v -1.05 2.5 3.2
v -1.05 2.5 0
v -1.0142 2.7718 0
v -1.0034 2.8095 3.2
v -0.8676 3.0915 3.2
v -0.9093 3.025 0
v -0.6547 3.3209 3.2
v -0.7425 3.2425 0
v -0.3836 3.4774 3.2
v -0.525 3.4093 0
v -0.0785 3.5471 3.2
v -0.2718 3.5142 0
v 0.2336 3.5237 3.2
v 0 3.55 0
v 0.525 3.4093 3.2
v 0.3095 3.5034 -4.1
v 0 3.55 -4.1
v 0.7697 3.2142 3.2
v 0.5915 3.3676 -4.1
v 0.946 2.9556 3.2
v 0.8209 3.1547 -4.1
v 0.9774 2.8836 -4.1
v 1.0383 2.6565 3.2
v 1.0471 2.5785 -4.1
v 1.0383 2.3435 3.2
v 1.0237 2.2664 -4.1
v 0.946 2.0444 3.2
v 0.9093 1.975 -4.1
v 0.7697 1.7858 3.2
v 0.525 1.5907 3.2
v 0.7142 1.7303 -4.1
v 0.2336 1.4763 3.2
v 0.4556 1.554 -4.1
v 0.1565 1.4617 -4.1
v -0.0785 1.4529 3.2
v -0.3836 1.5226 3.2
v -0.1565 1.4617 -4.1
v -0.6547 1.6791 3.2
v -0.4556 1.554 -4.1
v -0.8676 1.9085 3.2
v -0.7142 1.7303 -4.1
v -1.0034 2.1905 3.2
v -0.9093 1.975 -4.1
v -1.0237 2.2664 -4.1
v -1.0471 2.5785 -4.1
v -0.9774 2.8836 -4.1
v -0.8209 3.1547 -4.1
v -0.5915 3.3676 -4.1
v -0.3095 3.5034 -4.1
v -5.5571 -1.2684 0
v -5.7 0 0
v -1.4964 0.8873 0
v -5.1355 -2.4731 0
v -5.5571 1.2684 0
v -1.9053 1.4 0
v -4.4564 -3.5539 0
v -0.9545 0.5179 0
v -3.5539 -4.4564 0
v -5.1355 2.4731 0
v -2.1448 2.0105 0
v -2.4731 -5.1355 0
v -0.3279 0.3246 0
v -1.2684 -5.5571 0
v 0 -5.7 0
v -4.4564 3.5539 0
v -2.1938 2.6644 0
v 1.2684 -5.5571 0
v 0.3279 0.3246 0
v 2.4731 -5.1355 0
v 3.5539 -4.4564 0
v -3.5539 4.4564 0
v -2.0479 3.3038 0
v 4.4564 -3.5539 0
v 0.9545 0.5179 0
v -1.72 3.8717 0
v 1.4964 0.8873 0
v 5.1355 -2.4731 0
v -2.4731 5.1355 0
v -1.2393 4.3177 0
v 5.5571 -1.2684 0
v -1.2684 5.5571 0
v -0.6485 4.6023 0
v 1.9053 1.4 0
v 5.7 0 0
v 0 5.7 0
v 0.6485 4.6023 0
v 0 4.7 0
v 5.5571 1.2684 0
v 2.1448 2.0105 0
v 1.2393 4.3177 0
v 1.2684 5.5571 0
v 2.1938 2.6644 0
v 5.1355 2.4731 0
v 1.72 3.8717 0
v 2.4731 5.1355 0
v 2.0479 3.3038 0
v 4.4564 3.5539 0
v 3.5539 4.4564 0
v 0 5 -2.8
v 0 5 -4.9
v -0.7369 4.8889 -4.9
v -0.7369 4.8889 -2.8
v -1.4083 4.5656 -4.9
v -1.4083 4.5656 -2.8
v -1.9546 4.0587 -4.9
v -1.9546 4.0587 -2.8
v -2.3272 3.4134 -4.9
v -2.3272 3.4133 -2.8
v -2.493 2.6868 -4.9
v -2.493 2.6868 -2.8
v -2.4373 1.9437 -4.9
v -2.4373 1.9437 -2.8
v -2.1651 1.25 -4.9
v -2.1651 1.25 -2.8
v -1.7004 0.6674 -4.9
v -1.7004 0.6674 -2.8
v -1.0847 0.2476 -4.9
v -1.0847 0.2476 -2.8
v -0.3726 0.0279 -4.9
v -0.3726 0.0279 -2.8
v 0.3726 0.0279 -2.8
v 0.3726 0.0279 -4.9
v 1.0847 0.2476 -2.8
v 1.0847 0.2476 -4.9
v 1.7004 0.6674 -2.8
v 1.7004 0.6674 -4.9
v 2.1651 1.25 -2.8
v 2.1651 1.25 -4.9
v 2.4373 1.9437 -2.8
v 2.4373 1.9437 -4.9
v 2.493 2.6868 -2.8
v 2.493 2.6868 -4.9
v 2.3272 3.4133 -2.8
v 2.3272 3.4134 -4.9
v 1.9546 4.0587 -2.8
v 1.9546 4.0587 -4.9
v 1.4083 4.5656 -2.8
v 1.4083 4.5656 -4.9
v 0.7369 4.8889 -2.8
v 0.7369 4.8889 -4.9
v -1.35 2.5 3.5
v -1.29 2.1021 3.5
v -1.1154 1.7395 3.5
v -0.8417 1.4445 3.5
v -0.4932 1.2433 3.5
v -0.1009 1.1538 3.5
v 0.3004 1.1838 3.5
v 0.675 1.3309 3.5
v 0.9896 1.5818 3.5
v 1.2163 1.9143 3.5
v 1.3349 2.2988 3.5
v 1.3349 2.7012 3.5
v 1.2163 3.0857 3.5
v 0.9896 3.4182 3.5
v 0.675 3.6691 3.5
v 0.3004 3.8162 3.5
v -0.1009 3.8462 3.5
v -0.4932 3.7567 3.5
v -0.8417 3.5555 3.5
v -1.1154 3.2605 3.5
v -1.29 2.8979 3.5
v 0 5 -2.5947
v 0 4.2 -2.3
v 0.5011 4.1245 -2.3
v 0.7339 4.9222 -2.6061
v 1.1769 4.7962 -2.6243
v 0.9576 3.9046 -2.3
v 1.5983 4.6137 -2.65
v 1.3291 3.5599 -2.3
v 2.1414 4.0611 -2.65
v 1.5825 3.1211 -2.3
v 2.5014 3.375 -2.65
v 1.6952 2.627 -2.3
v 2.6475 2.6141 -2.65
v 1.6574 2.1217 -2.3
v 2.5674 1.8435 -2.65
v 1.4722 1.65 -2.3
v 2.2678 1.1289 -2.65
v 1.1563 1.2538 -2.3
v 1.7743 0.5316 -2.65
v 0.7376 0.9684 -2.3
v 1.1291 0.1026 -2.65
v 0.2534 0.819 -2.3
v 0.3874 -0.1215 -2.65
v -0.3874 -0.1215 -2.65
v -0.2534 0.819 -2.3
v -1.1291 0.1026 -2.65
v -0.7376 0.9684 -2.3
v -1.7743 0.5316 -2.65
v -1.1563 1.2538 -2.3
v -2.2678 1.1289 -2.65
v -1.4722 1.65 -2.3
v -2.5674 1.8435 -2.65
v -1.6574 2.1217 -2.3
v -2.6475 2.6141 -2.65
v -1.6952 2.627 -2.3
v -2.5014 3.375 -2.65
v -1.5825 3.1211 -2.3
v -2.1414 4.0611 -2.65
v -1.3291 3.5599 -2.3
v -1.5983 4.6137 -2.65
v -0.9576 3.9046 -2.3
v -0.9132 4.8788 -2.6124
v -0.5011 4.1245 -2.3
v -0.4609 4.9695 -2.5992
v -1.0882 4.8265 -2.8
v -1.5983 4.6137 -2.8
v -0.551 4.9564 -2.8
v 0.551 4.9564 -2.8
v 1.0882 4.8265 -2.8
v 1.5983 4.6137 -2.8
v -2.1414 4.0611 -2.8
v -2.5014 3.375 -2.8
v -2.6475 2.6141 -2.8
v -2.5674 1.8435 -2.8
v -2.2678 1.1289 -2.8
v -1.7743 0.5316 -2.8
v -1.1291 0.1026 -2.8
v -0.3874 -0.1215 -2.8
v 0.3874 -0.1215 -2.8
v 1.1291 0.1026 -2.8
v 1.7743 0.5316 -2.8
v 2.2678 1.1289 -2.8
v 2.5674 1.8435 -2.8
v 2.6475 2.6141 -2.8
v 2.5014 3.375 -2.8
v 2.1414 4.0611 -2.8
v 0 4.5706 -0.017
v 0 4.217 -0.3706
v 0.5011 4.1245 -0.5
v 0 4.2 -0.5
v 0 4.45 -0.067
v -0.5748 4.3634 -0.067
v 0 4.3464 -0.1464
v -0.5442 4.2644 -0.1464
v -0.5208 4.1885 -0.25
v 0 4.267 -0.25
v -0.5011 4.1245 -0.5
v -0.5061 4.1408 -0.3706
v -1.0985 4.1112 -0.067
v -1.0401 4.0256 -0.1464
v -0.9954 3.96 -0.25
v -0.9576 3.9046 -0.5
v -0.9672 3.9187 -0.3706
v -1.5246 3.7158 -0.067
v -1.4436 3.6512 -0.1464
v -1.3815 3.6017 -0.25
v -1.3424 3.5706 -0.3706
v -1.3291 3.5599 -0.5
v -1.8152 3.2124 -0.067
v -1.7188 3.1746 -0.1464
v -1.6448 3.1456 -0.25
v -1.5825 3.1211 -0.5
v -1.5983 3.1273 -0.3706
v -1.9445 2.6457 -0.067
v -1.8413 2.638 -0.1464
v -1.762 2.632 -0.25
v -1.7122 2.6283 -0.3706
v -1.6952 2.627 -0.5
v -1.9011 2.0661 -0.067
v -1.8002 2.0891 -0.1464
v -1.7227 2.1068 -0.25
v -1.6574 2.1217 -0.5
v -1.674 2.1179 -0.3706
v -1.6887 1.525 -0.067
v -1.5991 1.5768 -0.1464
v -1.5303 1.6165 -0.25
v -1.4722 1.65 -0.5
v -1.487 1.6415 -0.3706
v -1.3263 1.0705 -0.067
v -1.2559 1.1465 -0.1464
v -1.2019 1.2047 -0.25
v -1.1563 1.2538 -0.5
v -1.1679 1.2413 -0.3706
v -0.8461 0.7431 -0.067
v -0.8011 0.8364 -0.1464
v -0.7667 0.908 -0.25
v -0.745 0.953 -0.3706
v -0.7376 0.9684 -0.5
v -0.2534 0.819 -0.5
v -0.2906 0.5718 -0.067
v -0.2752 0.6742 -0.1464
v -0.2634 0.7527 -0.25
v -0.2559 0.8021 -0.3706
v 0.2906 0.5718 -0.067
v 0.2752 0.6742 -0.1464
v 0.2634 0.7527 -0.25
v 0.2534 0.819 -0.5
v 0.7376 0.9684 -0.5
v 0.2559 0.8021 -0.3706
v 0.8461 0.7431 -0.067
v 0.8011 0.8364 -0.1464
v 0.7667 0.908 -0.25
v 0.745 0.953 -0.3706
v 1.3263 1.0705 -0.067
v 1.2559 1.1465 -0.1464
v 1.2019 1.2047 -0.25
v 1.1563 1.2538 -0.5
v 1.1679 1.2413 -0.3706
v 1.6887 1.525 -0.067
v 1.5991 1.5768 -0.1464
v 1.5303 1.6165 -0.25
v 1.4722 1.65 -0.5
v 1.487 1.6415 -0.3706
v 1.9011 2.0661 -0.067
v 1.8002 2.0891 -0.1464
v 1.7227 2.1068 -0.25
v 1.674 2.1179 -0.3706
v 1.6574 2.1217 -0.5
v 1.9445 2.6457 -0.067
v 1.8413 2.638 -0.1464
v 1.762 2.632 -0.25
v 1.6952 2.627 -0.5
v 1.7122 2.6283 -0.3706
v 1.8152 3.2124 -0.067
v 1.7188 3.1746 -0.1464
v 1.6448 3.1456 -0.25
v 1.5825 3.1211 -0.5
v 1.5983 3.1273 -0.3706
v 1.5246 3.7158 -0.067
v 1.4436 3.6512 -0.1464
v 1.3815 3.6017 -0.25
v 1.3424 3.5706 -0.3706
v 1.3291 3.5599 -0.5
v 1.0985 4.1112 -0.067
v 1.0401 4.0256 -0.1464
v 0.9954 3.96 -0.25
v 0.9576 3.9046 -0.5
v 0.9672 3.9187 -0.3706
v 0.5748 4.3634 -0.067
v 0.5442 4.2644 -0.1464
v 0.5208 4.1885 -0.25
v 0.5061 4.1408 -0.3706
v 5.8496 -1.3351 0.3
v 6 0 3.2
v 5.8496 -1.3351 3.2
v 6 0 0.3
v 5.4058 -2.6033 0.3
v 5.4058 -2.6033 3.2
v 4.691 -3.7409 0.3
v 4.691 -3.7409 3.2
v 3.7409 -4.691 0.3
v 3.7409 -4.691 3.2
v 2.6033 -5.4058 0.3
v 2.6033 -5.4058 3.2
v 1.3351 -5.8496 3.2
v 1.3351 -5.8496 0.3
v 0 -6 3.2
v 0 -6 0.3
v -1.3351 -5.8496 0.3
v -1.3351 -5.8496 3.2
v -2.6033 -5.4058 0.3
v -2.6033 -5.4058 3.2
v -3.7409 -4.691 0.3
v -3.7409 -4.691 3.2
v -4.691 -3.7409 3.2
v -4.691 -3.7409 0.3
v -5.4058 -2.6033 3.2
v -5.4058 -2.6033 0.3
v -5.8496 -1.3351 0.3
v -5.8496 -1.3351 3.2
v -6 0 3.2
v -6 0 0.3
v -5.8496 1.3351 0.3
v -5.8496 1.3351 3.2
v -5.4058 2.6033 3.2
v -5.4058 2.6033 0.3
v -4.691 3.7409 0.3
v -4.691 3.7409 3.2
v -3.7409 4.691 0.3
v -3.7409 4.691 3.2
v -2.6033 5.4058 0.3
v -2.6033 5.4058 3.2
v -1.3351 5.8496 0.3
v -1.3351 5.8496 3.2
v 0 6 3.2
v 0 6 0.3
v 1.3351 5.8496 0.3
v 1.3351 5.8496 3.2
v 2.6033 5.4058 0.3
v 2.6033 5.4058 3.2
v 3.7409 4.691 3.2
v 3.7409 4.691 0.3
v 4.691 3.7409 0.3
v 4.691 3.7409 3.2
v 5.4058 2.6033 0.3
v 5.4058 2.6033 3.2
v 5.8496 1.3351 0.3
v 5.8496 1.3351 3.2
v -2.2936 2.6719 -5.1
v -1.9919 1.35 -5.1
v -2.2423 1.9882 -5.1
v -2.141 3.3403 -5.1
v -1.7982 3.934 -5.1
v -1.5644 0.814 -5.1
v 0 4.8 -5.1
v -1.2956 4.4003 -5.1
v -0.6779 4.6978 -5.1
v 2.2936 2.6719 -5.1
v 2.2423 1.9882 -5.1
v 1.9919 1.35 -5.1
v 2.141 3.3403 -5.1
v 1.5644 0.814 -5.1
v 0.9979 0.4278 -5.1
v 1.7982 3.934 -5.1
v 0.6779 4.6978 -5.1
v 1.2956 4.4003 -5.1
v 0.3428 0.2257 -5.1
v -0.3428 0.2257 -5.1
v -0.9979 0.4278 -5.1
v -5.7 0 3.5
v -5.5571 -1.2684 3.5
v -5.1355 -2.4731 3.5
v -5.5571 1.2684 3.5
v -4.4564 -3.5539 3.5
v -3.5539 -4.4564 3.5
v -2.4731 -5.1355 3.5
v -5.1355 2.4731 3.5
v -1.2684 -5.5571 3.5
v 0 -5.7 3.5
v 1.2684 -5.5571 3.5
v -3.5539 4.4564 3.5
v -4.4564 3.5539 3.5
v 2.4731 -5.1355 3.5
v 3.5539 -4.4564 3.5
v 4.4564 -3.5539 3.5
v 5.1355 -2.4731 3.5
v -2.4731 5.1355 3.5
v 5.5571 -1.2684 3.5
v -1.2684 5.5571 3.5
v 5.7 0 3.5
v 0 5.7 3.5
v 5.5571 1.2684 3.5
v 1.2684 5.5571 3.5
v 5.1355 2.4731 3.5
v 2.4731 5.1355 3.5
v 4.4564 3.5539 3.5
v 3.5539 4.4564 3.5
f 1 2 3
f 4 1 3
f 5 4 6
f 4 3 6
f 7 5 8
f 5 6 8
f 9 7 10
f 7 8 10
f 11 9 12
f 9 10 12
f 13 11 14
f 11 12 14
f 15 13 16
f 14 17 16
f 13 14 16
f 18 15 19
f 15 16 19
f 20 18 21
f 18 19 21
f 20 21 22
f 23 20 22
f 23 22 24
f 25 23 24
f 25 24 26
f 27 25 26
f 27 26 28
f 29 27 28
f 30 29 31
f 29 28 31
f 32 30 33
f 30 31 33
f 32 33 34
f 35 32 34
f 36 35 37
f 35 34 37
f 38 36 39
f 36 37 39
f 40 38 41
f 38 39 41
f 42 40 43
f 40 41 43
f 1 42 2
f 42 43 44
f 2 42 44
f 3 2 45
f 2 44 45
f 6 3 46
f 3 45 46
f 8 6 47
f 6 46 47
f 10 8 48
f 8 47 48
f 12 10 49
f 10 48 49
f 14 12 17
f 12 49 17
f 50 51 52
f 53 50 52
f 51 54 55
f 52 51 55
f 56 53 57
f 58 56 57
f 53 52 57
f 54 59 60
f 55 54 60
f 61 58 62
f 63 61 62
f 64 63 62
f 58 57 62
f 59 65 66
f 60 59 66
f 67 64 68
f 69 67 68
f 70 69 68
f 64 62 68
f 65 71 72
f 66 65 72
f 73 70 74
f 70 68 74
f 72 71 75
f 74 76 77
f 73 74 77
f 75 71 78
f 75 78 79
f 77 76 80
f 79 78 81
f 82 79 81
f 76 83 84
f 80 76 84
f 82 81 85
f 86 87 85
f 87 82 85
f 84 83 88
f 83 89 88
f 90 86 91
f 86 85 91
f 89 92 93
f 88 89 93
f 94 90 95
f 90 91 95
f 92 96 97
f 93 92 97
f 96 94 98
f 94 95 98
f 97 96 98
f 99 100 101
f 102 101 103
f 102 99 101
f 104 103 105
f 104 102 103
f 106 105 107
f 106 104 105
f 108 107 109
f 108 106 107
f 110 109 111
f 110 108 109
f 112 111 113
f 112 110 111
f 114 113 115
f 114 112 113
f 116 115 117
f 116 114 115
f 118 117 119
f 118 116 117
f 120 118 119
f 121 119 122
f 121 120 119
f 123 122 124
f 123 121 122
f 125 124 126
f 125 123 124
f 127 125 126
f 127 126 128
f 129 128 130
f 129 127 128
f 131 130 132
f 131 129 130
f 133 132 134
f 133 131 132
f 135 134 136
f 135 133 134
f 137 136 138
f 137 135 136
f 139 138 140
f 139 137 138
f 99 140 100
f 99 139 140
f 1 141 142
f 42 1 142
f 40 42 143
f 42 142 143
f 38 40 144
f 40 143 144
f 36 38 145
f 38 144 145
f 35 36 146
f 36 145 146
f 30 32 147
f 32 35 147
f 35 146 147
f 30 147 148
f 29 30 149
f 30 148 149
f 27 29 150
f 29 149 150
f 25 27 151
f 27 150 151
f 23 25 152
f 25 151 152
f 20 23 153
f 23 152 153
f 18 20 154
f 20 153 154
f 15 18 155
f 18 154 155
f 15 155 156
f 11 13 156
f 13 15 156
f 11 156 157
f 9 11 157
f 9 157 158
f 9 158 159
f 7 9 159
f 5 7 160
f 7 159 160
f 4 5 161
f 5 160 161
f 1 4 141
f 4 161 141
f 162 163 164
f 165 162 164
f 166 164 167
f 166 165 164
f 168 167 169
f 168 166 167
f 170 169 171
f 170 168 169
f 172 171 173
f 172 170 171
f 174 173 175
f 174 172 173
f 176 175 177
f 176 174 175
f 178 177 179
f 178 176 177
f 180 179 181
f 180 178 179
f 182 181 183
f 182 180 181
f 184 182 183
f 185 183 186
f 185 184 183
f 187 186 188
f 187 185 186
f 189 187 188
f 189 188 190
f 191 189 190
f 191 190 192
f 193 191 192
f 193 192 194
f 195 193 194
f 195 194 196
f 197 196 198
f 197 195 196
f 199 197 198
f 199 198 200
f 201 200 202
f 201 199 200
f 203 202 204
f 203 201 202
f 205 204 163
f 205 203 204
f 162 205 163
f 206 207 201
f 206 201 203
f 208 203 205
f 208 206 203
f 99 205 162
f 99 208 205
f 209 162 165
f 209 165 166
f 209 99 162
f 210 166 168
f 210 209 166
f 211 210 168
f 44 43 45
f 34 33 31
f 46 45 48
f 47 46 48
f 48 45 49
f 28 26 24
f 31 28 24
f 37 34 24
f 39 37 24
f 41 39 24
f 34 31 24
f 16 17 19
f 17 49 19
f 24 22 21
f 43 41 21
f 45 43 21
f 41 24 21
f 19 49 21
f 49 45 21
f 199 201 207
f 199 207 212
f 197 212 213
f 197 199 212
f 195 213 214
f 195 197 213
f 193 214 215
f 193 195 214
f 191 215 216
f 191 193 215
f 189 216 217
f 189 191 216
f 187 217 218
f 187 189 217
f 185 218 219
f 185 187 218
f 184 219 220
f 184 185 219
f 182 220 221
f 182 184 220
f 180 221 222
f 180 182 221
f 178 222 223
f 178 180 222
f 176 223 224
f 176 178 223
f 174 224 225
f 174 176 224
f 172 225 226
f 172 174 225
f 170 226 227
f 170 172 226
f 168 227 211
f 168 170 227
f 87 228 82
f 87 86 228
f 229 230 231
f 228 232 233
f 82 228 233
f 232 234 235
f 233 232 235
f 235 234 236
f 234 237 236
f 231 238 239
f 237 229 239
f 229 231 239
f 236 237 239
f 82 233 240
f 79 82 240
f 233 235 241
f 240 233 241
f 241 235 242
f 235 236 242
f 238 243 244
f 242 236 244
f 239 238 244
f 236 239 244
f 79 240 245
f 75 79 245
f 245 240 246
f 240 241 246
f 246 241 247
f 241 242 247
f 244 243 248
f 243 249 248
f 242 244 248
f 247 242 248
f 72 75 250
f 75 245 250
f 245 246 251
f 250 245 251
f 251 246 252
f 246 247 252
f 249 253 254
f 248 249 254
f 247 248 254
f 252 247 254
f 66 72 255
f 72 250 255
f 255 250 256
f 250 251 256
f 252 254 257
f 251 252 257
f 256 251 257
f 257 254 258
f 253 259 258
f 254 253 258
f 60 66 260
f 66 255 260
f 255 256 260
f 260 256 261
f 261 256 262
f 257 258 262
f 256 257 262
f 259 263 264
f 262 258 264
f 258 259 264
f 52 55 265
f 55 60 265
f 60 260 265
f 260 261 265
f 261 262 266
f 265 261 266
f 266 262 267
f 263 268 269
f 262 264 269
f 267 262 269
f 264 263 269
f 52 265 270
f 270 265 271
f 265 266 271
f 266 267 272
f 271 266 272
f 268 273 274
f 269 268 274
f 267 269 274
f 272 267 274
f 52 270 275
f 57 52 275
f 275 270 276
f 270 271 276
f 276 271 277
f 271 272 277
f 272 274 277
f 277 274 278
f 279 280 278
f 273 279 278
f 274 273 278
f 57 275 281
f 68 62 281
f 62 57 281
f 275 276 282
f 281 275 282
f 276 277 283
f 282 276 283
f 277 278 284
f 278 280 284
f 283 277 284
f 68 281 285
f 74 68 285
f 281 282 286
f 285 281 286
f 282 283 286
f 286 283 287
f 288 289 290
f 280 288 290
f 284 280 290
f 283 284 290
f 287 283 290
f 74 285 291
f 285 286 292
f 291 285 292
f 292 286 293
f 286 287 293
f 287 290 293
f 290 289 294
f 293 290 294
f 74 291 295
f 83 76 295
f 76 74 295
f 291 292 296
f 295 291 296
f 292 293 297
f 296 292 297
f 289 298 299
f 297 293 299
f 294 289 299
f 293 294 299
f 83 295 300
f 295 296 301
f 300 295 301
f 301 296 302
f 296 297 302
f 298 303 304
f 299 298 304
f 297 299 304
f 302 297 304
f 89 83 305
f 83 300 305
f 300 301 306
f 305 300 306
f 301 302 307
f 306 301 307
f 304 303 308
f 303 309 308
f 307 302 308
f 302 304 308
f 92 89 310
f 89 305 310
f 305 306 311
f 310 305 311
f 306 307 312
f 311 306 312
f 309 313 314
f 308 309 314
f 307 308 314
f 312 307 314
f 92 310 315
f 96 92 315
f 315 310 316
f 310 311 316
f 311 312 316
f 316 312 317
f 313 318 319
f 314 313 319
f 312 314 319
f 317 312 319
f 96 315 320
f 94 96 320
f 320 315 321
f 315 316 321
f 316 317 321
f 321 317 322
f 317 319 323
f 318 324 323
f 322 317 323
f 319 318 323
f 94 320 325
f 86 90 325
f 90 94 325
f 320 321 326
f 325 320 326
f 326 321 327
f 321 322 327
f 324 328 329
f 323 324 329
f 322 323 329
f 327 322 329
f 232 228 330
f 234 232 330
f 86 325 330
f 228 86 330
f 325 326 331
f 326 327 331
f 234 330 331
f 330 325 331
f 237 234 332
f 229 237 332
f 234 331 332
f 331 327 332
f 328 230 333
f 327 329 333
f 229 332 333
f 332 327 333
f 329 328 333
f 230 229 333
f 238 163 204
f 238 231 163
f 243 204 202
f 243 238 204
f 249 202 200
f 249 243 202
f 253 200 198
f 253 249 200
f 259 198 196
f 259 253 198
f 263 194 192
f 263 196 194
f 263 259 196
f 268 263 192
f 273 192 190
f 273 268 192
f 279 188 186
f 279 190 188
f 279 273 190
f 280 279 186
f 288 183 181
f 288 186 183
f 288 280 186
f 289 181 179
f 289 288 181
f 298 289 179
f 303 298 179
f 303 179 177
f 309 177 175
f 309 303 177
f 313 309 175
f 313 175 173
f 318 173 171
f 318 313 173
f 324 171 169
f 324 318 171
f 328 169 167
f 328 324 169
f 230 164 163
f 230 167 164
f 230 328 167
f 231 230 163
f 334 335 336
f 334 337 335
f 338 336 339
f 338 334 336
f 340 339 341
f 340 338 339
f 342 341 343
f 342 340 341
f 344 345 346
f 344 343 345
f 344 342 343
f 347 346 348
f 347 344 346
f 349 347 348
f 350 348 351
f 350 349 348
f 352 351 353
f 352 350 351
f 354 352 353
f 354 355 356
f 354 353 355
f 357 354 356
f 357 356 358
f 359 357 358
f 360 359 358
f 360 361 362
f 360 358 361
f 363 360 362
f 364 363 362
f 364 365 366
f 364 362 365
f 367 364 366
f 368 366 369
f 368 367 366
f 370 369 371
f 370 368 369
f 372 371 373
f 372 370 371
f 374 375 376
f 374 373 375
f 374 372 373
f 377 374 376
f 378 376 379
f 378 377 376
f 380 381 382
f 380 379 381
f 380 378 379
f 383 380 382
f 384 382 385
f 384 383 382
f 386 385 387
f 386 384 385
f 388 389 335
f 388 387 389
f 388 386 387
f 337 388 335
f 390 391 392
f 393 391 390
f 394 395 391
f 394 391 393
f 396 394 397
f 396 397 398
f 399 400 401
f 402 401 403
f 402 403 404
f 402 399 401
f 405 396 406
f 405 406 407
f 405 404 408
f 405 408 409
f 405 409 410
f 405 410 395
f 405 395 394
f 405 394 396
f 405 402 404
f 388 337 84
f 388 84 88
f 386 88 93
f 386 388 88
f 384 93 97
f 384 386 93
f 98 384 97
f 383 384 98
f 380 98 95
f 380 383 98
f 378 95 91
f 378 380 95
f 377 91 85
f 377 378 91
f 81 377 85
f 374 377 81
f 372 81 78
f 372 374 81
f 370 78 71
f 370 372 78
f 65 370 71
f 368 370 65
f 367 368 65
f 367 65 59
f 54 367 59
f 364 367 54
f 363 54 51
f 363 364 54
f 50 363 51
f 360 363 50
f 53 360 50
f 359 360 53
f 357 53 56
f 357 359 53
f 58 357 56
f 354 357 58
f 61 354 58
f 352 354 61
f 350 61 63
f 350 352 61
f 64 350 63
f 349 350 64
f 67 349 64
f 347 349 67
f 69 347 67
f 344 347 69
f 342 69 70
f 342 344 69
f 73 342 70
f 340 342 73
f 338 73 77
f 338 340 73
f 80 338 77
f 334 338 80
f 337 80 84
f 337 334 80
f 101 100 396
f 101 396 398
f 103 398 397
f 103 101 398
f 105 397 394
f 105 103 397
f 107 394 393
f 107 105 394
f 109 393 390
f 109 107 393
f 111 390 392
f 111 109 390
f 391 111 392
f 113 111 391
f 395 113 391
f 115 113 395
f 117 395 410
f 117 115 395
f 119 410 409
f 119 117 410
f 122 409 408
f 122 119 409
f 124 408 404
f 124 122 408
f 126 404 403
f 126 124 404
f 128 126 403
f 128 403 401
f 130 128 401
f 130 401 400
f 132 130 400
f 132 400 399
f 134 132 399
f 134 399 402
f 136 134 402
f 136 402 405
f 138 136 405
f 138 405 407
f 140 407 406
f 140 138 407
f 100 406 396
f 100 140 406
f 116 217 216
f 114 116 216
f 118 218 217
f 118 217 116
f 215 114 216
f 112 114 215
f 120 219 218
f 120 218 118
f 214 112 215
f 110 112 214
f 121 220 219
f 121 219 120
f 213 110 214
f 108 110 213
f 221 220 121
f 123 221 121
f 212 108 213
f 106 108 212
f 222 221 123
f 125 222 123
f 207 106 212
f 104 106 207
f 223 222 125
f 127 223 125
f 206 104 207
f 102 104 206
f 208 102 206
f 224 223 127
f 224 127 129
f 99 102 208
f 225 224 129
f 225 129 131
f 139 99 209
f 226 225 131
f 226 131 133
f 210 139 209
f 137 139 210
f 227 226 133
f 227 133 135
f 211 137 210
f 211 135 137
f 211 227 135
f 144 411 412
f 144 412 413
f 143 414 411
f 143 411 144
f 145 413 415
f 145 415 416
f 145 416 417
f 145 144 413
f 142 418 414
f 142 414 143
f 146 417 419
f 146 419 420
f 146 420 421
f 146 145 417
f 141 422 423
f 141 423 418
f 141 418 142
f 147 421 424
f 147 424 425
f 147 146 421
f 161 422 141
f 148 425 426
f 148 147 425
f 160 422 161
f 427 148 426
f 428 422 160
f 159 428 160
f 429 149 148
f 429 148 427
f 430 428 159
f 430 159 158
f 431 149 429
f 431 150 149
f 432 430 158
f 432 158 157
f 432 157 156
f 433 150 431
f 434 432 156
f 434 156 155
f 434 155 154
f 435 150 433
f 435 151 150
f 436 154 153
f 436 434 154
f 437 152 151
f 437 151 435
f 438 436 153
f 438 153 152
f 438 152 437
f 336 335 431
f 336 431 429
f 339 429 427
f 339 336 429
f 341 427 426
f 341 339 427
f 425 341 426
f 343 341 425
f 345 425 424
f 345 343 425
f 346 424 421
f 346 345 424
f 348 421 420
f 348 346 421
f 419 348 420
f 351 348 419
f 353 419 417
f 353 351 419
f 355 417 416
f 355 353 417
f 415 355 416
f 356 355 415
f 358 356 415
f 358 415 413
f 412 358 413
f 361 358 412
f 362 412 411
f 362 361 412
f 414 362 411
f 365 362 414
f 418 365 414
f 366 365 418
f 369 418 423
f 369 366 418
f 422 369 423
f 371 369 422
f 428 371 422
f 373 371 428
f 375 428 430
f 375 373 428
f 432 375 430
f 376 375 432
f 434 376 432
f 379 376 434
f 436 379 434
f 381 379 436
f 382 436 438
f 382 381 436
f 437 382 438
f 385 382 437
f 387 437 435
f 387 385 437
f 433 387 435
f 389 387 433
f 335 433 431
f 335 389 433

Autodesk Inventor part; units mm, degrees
ref_plane "YZ Plane" through (0, 0, 0) normal (1, 0, 0) x (0, 1, 0)
ref_plane "XZ Plane" through (0, 0, 0) normal (0, 1, 0) x (-1, 0, 0)
ref_plane "XY Plane" through (0, 0, 0) normal (0, 0, 1) x (1, 0, 0)
sketch "Sketch1" plane through (0, 0, 0) normal (0, 0, 1) x (1, 0, 0)
  circle A0 centre (0, 0) radius 6
  dimension "d0" = 12
extrude "Extrusion1" add sketch "Sketch1" along normal blind 3.5
sketch "Sketch2" plane through (0, 0, 3.5) normal (0, 0, 1) x (1, 0, 0)
  circle A0 centre (0, 2.5) radius 1.05
  line L0 (0, 2.5) -> (0, 0) construction
  dimension "d3" = 2.1
  dimension "d4" = 2.5
extrude "Extrusion2" add sketch "Sketch2" along normal blind 15 and the other way blind 8.25
chamfer "Chamfer1" distance 0.3 angle 45 2 edges at (-6, 0, 3.5) (-6, 0, 0)
sketch "Sketch4" plane through (0, 2.5, -4.75) normal (0, 0, -1) x (-1, 0, 0)
  circle A0 centre (0, 0) radius 1.05 projected
  point P0 (0, -2.5)
extrude "Extrusion4" cut sketch "Sketch4" against normal through all
sketch "Sketch5" plane through (0, 0, 0) normal (1, 0, 0) x (0, 1, 0)
  line L0 (3.55, 0) -> (1.45, 0) construction
  line L1 (2.5, 0) -> (2.5, -4.1) construction
  line L2 (2.5, -5.1) -> (4.8, -5.1)
  line L3 (4.8, -5.1) -> (5, -4.9)
  line L4 (5, -4.9) -> (5, -2.8)
  line L5 (5, -2.8) -> (5.15, -2.8)
  line L6 (5.15, -2.8) -> (5.15, -2.65)
  line L7 (5.15, -2.65) -> (4.2, -2.3)
  line L8 (4.2, -2.3) -> (4.2, 0)
  line L9 (4.2, 0) -> (3.55, 0)
  line L10 (3.55, 0) -> (3.55, -4.1)
  line L11 (3.55, -4.1) -> (2.5, -4.1)
  line L12 (2.5, -4.1) -> (2.5, -5.1)
  line L13 (3.55, 0) -> (2.5, 0) construction
  point P0 (0, 0)
  dimension "d17" = 2.3
  dimension "d18" = 135
  dimension "d19" = 0.2
  dimension "d20" = 2.5
  dimension "d21" = 0.15
  dimension "d22" = 0.15
  dimension "d23" = 2.3
  dimension "d24" = 1.7
  dimension "d25" = 2.8
  dimension "d26" = 1
revolve "Revolution1" add sketch "Sketch5" angle 360 about axis through (0, 2.5, 0) along (0, 0, -1)
fillet "Fillet1" radius 0.5 1 edges at (0, 0.8, 0)
chamfer "Chamfer2" distance 0.3 angle 45 1 edges at (1.05, 2.5, 3.5)
sketch "Sketch6" plane through (0, 2.5, -2.8) normal (0, 0, -1) x (-1, 0, 0)
  circle A0 centre (0, -1) radius 3.5
  circle A1 centre (0, 0) radius 2.5 projected
  circle A2 centre (0, 0) radius 2.65 projected
  line L0 (0, 0) -> (0, -1) construction
  point P0 (0, -2.5)
  point P1 (1.5983, 2.1137)
  point P2 (-1.5983, 2.1137)
  dimension "d32" = 1
extrude "Extrusion5" cut sketch "Sketch6" against normal blind 1 contours A0 A2 picked at (0.1892, 2.5795)
properties part number "TestCam"
